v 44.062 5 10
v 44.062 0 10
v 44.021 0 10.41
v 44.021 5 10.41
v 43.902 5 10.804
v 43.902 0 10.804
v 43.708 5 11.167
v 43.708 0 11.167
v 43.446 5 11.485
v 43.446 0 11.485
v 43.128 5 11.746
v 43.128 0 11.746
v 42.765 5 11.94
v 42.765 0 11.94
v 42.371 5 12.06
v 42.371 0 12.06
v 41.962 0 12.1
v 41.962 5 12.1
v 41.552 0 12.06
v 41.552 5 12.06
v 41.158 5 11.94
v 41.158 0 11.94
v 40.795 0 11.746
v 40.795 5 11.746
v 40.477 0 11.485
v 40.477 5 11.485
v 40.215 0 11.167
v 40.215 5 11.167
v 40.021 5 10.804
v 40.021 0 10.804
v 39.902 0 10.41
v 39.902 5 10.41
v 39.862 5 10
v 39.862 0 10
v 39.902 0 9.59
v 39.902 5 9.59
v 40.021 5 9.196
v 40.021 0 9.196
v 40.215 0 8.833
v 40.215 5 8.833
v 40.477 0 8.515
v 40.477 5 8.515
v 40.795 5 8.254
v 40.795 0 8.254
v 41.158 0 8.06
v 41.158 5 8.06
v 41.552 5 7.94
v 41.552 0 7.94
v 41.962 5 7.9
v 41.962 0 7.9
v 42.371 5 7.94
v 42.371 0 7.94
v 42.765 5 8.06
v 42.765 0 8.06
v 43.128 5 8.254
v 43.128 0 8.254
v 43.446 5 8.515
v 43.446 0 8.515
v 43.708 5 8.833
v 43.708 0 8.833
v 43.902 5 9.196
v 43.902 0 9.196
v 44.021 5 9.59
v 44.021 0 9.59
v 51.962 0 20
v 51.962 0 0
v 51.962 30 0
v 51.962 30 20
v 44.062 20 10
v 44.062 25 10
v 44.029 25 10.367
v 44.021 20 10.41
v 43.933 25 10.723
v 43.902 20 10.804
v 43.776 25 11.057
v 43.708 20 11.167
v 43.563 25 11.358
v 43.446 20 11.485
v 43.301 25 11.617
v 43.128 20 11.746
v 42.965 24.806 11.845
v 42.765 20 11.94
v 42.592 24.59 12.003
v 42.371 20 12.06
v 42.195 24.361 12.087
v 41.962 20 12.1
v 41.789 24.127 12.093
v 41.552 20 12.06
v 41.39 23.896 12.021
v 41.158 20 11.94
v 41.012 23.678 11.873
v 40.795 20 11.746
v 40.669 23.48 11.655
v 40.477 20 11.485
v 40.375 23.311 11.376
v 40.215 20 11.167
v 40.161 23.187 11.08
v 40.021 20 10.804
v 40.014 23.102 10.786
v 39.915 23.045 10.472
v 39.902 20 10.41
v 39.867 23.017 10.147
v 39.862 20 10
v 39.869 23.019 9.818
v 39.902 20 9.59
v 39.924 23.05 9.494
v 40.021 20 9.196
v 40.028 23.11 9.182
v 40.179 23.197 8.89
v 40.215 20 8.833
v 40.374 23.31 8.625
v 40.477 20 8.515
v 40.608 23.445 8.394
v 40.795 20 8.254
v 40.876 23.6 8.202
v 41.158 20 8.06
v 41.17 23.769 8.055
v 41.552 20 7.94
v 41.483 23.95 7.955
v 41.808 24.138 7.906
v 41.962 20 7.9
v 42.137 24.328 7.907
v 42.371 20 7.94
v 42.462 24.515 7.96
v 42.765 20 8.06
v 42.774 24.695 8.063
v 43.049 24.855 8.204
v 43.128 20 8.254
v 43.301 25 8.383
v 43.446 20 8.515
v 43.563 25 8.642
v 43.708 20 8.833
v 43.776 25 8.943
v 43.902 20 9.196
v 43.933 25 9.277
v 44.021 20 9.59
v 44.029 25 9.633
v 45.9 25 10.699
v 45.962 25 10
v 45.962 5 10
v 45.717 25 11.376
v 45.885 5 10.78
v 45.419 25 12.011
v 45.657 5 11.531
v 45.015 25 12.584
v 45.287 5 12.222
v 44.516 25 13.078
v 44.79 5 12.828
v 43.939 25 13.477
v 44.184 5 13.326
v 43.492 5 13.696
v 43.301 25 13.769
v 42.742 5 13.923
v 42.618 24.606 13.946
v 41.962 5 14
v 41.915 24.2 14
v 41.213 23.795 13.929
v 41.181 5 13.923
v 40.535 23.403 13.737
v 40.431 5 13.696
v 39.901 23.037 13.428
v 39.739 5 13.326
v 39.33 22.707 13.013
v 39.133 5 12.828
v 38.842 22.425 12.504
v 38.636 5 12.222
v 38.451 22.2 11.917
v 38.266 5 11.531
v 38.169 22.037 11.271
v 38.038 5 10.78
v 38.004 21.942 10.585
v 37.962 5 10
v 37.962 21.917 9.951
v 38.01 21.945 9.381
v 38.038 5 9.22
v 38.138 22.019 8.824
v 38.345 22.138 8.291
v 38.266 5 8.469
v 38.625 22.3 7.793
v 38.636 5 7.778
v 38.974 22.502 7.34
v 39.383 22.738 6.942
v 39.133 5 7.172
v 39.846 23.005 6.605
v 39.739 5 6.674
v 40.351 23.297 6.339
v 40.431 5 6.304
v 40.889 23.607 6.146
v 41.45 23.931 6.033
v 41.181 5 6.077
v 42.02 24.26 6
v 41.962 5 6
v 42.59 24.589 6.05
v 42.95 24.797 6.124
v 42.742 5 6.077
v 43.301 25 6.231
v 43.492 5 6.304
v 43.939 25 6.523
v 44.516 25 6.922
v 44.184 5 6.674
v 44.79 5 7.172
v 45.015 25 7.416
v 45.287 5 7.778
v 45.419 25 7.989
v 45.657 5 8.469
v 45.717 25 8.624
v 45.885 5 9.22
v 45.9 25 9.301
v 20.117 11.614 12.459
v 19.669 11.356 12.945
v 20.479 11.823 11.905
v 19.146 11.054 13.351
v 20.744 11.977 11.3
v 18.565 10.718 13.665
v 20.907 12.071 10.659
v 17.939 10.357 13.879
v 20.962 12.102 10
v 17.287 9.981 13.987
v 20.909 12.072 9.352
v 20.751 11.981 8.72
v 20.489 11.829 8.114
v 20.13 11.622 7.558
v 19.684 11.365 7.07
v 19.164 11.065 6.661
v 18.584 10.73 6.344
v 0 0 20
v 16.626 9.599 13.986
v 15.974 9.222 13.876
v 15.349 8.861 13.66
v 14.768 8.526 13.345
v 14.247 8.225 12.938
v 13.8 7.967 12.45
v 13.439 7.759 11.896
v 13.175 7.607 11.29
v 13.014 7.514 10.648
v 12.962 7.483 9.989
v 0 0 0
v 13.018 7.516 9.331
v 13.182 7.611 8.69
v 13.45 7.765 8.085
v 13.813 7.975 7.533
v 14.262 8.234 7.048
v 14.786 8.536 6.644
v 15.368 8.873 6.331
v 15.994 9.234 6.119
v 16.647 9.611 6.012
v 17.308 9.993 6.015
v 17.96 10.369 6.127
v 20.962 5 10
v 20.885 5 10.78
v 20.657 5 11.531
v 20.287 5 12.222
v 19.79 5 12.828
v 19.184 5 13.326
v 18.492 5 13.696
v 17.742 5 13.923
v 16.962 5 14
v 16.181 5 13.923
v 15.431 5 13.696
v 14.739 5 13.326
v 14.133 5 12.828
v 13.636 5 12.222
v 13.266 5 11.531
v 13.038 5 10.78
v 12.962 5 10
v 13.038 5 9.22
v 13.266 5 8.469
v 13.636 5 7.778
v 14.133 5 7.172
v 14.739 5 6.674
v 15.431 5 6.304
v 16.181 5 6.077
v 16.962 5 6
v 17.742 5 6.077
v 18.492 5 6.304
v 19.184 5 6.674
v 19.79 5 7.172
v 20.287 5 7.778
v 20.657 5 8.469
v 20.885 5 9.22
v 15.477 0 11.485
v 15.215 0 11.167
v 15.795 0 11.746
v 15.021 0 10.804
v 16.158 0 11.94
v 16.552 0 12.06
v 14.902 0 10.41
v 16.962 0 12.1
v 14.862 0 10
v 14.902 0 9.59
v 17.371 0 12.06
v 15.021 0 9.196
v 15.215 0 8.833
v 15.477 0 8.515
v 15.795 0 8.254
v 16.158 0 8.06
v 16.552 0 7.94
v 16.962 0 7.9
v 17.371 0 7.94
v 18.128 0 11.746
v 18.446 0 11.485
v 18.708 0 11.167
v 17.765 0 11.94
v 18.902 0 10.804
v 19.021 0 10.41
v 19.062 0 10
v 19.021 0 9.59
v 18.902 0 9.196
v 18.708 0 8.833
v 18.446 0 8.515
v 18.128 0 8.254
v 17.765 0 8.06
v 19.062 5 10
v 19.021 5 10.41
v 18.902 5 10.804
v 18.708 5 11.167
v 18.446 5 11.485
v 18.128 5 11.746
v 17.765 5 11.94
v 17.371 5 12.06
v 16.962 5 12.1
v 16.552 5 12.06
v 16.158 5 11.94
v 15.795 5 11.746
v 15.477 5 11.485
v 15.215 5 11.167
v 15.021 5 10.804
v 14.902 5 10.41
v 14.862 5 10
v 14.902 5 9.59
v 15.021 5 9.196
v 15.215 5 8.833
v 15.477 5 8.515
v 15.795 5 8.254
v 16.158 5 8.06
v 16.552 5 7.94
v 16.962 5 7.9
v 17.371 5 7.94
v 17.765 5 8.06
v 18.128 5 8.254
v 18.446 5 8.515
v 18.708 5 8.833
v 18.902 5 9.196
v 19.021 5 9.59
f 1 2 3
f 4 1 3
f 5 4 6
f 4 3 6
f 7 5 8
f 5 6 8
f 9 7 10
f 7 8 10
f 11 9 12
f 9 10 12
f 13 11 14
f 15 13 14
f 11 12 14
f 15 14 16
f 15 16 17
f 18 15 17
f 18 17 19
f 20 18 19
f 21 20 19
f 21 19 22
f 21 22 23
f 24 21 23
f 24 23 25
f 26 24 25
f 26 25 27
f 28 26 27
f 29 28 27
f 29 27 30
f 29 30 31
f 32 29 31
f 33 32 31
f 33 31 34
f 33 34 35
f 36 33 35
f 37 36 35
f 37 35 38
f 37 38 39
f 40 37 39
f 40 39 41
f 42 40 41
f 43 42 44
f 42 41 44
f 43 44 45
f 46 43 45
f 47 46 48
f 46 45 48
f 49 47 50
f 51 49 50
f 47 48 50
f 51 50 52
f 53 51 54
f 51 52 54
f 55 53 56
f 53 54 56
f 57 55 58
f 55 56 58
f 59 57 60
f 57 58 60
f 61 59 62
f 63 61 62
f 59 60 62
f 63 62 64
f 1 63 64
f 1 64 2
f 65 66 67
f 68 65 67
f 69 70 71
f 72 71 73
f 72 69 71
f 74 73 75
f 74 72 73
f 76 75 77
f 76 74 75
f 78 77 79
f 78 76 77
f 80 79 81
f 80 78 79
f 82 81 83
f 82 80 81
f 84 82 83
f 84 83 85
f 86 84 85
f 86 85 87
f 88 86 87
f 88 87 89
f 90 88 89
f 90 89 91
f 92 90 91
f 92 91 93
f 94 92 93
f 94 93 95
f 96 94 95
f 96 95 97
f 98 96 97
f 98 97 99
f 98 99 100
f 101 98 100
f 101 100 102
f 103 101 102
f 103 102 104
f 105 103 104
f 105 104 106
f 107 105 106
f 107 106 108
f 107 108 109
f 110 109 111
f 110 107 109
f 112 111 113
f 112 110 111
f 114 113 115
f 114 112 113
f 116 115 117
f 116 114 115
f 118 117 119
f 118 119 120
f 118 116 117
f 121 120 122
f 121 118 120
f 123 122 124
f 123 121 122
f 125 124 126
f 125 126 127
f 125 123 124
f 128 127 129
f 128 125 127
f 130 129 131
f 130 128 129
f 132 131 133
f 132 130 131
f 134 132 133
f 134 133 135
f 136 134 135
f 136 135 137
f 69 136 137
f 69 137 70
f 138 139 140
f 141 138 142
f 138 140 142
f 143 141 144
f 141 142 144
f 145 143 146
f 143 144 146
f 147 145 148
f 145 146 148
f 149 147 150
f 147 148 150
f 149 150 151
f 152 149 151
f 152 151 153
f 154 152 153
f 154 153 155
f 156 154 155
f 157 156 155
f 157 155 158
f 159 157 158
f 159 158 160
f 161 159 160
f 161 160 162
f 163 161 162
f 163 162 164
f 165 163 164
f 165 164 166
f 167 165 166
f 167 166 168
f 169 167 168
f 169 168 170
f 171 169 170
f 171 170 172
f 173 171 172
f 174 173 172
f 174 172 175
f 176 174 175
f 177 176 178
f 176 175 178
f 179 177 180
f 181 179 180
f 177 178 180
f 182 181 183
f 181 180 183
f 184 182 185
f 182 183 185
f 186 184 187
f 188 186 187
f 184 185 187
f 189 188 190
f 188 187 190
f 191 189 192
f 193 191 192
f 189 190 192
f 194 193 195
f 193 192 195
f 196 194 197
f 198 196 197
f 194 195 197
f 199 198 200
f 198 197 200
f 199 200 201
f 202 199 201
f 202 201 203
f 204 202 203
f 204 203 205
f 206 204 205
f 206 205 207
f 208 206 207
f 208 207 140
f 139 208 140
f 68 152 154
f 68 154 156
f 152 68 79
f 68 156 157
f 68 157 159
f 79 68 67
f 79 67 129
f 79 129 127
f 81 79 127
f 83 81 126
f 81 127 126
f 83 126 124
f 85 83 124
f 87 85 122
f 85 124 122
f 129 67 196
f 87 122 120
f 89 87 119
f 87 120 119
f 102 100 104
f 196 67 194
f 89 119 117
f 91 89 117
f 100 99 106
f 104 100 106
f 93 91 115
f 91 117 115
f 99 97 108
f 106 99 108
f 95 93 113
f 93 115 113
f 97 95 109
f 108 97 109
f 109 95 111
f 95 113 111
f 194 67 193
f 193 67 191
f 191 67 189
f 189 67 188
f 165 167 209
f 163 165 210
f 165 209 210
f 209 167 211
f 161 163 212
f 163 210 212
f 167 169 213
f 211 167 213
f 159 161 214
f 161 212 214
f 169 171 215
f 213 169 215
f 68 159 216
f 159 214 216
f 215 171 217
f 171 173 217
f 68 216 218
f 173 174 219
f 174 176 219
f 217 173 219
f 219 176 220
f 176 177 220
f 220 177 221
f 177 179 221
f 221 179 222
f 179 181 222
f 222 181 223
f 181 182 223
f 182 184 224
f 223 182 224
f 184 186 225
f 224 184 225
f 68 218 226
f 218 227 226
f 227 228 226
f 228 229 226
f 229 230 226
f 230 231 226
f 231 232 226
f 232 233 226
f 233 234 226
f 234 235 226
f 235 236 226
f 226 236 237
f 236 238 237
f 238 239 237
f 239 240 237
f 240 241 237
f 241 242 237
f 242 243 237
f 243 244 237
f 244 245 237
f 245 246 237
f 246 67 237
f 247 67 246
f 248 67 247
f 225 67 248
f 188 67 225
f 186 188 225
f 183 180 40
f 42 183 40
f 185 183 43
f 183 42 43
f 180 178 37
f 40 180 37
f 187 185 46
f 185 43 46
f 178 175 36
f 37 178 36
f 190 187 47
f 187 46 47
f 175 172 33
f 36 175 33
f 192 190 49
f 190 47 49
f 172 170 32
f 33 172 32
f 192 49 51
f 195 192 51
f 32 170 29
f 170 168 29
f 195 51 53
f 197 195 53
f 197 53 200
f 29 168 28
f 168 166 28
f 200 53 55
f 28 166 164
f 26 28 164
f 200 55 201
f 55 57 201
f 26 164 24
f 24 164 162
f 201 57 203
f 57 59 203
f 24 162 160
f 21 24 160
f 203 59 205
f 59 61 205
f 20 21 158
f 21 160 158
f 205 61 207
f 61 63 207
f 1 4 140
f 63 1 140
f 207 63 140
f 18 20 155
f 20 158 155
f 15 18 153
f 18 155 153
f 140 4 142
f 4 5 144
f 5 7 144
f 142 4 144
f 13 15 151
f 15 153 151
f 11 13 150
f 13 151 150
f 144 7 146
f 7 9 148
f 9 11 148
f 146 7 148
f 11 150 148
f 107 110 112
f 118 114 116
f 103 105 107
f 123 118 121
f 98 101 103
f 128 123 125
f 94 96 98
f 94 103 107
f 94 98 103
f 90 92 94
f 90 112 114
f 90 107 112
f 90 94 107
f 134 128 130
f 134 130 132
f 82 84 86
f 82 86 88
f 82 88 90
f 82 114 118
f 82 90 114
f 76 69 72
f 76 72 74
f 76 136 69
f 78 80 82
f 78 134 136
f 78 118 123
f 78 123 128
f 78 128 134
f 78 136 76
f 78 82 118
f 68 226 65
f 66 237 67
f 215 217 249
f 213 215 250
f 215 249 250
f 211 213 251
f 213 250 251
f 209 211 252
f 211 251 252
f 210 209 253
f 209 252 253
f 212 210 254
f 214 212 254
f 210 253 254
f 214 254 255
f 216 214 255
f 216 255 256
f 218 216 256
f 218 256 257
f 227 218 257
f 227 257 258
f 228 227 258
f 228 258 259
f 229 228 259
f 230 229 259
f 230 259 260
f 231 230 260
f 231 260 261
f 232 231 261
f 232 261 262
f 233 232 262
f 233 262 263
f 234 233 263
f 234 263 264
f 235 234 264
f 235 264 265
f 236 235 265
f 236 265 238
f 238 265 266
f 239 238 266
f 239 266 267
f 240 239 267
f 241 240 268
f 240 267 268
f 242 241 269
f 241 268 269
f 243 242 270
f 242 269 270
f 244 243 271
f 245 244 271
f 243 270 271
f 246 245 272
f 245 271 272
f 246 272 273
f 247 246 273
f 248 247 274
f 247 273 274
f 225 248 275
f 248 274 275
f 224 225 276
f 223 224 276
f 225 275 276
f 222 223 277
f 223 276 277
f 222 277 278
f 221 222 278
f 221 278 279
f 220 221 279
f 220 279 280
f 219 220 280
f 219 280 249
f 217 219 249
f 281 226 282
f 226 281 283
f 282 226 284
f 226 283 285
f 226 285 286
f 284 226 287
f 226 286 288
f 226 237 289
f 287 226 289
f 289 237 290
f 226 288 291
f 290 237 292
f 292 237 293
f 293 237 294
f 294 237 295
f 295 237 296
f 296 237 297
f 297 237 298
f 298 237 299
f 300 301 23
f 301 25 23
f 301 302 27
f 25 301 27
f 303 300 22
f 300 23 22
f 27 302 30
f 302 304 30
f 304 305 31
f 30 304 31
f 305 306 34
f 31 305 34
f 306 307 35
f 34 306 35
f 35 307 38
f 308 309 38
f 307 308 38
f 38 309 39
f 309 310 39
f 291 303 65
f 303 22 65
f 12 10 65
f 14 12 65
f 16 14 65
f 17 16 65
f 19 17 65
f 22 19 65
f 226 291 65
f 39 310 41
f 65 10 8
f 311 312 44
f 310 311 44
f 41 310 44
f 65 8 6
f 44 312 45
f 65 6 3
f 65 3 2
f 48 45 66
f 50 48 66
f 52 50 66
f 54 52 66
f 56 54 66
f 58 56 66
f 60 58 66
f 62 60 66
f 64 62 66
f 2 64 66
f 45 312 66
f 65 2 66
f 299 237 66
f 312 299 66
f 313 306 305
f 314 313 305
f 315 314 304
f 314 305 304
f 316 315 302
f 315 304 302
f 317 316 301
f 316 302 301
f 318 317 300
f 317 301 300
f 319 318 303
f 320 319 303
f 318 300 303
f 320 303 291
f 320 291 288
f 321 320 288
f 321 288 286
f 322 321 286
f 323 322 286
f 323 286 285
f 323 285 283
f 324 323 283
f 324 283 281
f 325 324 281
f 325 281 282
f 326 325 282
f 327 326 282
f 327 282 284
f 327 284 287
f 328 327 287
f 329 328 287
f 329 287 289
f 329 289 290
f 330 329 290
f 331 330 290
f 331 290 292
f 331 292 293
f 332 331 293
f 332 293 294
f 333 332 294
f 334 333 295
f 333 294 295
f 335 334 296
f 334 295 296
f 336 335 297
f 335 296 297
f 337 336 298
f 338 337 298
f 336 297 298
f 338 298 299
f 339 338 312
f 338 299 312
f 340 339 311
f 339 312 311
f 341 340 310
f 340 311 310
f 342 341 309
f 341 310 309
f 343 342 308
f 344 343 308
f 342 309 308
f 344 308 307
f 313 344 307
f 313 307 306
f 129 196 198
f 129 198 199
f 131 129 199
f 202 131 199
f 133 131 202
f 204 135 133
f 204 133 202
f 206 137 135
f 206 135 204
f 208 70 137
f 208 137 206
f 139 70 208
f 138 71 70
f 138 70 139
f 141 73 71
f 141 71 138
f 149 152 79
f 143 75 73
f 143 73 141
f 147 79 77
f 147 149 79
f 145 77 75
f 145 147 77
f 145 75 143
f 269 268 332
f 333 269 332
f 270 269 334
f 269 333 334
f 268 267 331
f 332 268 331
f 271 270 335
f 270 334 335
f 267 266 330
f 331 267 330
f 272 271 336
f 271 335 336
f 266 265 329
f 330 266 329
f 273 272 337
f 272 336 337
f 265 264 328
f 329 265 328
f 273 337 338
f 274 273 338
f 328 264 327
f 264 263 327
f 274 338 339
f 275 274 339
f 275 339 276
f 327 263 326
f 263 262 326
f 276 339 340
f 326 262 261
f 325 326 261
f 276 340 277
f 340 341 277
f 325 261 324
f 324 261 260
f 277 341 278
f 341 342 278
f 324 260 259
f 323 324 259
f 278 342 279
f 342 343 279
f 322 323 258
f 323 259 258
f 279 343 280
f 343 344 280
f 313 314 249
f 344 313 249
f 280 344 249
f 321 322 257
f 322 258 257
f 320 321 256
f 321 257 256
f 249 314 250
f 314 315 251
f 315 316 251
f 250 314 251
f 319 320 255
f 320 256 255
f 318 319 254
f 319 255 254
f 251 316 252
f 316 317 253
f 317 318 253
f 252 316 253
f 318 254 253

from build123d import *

# Parameters (mm, degrees)
EXTRUDE_1_DEPTH     = 20
SKETCH_2_R          = 2.1
CUT_EXTRUDE_1_DEPTH = 20
SKETCH_3_R          = 4
SKETCH_3_R_2        = 2.1
CUT_EXTRUDE_2_DEPTH = 20


with BuildPart() as part:
    # ｽｹｯﾁ1 → ﾎﾞｽ - 押し出し1 (new body)
    with BuildSketch(Plane.XY):
        Polygon((0, 0), (51.961524227, 0), (51.961524227, 30), align=None)
    extrude(amount=EXTRUDE_1_DEPTH)

    # ｽｹｯﾁ2 → ｶｯﾄ - 押し出し1 (cut)
    with BuildSketch(Plane(origin=(0, 0, 0), x_dir=(-1, 0, 0), z_dir=(0, -1, 0))):
        with Locations(Location((-16.961524227, -10, 0), (0, 0, 180))):
            Circle(SKETCH_2_R)
        with Locations(Location((-41.961524227, -10, 0), (0, 0, 180))):
            Circle(SKETCH_2_R)
    extrude(amount=-CUT_EXTRUDE_1_DEPTH, mode=Mode.SUBTRACT)

    # ｽｹｯﾁ3 → ｶｯﾄ - 押し出し2 (cut)
    # profile 1 of 2: a face of its own
    with BuildSketch(Plane(origin=(0, 5, 0), x_dir=(-1, 0, 0), z_dir=(0, -1, 0))):
        with Locations(Location((-16.961524227, -10, 0), (0, 0, 180))):
            Circle(SKETCH_3_R)
        with Locations(Location((-16.961524227, -10, 0), (0, 0, 180))):
            Circle(SKETCH_3_R_2, mode=Mode.SUBTRACT)
    # profile 2 of 2: a face of its own
    with BuildSketch(Plane(origin=(0, 5, 0), x_dir=(-1, 0, 0), z_dir=(0, -1, 0))):
        with Locations(Location((-41.961524227, -10, 0), (0, 0, 180))):
            Circle(SKETCH_3_R)
        with Locations(Location((-41.961524227, -10, 0), (0, 0, 180))):
            Circle(SKETCH_3_R_2, mode=Mode.SUBTRACT)
    extrude(amount=-CUT_EXTRUDE_2_DEPTH, mode=Mode.SUBTRACT)


solid = part.part
